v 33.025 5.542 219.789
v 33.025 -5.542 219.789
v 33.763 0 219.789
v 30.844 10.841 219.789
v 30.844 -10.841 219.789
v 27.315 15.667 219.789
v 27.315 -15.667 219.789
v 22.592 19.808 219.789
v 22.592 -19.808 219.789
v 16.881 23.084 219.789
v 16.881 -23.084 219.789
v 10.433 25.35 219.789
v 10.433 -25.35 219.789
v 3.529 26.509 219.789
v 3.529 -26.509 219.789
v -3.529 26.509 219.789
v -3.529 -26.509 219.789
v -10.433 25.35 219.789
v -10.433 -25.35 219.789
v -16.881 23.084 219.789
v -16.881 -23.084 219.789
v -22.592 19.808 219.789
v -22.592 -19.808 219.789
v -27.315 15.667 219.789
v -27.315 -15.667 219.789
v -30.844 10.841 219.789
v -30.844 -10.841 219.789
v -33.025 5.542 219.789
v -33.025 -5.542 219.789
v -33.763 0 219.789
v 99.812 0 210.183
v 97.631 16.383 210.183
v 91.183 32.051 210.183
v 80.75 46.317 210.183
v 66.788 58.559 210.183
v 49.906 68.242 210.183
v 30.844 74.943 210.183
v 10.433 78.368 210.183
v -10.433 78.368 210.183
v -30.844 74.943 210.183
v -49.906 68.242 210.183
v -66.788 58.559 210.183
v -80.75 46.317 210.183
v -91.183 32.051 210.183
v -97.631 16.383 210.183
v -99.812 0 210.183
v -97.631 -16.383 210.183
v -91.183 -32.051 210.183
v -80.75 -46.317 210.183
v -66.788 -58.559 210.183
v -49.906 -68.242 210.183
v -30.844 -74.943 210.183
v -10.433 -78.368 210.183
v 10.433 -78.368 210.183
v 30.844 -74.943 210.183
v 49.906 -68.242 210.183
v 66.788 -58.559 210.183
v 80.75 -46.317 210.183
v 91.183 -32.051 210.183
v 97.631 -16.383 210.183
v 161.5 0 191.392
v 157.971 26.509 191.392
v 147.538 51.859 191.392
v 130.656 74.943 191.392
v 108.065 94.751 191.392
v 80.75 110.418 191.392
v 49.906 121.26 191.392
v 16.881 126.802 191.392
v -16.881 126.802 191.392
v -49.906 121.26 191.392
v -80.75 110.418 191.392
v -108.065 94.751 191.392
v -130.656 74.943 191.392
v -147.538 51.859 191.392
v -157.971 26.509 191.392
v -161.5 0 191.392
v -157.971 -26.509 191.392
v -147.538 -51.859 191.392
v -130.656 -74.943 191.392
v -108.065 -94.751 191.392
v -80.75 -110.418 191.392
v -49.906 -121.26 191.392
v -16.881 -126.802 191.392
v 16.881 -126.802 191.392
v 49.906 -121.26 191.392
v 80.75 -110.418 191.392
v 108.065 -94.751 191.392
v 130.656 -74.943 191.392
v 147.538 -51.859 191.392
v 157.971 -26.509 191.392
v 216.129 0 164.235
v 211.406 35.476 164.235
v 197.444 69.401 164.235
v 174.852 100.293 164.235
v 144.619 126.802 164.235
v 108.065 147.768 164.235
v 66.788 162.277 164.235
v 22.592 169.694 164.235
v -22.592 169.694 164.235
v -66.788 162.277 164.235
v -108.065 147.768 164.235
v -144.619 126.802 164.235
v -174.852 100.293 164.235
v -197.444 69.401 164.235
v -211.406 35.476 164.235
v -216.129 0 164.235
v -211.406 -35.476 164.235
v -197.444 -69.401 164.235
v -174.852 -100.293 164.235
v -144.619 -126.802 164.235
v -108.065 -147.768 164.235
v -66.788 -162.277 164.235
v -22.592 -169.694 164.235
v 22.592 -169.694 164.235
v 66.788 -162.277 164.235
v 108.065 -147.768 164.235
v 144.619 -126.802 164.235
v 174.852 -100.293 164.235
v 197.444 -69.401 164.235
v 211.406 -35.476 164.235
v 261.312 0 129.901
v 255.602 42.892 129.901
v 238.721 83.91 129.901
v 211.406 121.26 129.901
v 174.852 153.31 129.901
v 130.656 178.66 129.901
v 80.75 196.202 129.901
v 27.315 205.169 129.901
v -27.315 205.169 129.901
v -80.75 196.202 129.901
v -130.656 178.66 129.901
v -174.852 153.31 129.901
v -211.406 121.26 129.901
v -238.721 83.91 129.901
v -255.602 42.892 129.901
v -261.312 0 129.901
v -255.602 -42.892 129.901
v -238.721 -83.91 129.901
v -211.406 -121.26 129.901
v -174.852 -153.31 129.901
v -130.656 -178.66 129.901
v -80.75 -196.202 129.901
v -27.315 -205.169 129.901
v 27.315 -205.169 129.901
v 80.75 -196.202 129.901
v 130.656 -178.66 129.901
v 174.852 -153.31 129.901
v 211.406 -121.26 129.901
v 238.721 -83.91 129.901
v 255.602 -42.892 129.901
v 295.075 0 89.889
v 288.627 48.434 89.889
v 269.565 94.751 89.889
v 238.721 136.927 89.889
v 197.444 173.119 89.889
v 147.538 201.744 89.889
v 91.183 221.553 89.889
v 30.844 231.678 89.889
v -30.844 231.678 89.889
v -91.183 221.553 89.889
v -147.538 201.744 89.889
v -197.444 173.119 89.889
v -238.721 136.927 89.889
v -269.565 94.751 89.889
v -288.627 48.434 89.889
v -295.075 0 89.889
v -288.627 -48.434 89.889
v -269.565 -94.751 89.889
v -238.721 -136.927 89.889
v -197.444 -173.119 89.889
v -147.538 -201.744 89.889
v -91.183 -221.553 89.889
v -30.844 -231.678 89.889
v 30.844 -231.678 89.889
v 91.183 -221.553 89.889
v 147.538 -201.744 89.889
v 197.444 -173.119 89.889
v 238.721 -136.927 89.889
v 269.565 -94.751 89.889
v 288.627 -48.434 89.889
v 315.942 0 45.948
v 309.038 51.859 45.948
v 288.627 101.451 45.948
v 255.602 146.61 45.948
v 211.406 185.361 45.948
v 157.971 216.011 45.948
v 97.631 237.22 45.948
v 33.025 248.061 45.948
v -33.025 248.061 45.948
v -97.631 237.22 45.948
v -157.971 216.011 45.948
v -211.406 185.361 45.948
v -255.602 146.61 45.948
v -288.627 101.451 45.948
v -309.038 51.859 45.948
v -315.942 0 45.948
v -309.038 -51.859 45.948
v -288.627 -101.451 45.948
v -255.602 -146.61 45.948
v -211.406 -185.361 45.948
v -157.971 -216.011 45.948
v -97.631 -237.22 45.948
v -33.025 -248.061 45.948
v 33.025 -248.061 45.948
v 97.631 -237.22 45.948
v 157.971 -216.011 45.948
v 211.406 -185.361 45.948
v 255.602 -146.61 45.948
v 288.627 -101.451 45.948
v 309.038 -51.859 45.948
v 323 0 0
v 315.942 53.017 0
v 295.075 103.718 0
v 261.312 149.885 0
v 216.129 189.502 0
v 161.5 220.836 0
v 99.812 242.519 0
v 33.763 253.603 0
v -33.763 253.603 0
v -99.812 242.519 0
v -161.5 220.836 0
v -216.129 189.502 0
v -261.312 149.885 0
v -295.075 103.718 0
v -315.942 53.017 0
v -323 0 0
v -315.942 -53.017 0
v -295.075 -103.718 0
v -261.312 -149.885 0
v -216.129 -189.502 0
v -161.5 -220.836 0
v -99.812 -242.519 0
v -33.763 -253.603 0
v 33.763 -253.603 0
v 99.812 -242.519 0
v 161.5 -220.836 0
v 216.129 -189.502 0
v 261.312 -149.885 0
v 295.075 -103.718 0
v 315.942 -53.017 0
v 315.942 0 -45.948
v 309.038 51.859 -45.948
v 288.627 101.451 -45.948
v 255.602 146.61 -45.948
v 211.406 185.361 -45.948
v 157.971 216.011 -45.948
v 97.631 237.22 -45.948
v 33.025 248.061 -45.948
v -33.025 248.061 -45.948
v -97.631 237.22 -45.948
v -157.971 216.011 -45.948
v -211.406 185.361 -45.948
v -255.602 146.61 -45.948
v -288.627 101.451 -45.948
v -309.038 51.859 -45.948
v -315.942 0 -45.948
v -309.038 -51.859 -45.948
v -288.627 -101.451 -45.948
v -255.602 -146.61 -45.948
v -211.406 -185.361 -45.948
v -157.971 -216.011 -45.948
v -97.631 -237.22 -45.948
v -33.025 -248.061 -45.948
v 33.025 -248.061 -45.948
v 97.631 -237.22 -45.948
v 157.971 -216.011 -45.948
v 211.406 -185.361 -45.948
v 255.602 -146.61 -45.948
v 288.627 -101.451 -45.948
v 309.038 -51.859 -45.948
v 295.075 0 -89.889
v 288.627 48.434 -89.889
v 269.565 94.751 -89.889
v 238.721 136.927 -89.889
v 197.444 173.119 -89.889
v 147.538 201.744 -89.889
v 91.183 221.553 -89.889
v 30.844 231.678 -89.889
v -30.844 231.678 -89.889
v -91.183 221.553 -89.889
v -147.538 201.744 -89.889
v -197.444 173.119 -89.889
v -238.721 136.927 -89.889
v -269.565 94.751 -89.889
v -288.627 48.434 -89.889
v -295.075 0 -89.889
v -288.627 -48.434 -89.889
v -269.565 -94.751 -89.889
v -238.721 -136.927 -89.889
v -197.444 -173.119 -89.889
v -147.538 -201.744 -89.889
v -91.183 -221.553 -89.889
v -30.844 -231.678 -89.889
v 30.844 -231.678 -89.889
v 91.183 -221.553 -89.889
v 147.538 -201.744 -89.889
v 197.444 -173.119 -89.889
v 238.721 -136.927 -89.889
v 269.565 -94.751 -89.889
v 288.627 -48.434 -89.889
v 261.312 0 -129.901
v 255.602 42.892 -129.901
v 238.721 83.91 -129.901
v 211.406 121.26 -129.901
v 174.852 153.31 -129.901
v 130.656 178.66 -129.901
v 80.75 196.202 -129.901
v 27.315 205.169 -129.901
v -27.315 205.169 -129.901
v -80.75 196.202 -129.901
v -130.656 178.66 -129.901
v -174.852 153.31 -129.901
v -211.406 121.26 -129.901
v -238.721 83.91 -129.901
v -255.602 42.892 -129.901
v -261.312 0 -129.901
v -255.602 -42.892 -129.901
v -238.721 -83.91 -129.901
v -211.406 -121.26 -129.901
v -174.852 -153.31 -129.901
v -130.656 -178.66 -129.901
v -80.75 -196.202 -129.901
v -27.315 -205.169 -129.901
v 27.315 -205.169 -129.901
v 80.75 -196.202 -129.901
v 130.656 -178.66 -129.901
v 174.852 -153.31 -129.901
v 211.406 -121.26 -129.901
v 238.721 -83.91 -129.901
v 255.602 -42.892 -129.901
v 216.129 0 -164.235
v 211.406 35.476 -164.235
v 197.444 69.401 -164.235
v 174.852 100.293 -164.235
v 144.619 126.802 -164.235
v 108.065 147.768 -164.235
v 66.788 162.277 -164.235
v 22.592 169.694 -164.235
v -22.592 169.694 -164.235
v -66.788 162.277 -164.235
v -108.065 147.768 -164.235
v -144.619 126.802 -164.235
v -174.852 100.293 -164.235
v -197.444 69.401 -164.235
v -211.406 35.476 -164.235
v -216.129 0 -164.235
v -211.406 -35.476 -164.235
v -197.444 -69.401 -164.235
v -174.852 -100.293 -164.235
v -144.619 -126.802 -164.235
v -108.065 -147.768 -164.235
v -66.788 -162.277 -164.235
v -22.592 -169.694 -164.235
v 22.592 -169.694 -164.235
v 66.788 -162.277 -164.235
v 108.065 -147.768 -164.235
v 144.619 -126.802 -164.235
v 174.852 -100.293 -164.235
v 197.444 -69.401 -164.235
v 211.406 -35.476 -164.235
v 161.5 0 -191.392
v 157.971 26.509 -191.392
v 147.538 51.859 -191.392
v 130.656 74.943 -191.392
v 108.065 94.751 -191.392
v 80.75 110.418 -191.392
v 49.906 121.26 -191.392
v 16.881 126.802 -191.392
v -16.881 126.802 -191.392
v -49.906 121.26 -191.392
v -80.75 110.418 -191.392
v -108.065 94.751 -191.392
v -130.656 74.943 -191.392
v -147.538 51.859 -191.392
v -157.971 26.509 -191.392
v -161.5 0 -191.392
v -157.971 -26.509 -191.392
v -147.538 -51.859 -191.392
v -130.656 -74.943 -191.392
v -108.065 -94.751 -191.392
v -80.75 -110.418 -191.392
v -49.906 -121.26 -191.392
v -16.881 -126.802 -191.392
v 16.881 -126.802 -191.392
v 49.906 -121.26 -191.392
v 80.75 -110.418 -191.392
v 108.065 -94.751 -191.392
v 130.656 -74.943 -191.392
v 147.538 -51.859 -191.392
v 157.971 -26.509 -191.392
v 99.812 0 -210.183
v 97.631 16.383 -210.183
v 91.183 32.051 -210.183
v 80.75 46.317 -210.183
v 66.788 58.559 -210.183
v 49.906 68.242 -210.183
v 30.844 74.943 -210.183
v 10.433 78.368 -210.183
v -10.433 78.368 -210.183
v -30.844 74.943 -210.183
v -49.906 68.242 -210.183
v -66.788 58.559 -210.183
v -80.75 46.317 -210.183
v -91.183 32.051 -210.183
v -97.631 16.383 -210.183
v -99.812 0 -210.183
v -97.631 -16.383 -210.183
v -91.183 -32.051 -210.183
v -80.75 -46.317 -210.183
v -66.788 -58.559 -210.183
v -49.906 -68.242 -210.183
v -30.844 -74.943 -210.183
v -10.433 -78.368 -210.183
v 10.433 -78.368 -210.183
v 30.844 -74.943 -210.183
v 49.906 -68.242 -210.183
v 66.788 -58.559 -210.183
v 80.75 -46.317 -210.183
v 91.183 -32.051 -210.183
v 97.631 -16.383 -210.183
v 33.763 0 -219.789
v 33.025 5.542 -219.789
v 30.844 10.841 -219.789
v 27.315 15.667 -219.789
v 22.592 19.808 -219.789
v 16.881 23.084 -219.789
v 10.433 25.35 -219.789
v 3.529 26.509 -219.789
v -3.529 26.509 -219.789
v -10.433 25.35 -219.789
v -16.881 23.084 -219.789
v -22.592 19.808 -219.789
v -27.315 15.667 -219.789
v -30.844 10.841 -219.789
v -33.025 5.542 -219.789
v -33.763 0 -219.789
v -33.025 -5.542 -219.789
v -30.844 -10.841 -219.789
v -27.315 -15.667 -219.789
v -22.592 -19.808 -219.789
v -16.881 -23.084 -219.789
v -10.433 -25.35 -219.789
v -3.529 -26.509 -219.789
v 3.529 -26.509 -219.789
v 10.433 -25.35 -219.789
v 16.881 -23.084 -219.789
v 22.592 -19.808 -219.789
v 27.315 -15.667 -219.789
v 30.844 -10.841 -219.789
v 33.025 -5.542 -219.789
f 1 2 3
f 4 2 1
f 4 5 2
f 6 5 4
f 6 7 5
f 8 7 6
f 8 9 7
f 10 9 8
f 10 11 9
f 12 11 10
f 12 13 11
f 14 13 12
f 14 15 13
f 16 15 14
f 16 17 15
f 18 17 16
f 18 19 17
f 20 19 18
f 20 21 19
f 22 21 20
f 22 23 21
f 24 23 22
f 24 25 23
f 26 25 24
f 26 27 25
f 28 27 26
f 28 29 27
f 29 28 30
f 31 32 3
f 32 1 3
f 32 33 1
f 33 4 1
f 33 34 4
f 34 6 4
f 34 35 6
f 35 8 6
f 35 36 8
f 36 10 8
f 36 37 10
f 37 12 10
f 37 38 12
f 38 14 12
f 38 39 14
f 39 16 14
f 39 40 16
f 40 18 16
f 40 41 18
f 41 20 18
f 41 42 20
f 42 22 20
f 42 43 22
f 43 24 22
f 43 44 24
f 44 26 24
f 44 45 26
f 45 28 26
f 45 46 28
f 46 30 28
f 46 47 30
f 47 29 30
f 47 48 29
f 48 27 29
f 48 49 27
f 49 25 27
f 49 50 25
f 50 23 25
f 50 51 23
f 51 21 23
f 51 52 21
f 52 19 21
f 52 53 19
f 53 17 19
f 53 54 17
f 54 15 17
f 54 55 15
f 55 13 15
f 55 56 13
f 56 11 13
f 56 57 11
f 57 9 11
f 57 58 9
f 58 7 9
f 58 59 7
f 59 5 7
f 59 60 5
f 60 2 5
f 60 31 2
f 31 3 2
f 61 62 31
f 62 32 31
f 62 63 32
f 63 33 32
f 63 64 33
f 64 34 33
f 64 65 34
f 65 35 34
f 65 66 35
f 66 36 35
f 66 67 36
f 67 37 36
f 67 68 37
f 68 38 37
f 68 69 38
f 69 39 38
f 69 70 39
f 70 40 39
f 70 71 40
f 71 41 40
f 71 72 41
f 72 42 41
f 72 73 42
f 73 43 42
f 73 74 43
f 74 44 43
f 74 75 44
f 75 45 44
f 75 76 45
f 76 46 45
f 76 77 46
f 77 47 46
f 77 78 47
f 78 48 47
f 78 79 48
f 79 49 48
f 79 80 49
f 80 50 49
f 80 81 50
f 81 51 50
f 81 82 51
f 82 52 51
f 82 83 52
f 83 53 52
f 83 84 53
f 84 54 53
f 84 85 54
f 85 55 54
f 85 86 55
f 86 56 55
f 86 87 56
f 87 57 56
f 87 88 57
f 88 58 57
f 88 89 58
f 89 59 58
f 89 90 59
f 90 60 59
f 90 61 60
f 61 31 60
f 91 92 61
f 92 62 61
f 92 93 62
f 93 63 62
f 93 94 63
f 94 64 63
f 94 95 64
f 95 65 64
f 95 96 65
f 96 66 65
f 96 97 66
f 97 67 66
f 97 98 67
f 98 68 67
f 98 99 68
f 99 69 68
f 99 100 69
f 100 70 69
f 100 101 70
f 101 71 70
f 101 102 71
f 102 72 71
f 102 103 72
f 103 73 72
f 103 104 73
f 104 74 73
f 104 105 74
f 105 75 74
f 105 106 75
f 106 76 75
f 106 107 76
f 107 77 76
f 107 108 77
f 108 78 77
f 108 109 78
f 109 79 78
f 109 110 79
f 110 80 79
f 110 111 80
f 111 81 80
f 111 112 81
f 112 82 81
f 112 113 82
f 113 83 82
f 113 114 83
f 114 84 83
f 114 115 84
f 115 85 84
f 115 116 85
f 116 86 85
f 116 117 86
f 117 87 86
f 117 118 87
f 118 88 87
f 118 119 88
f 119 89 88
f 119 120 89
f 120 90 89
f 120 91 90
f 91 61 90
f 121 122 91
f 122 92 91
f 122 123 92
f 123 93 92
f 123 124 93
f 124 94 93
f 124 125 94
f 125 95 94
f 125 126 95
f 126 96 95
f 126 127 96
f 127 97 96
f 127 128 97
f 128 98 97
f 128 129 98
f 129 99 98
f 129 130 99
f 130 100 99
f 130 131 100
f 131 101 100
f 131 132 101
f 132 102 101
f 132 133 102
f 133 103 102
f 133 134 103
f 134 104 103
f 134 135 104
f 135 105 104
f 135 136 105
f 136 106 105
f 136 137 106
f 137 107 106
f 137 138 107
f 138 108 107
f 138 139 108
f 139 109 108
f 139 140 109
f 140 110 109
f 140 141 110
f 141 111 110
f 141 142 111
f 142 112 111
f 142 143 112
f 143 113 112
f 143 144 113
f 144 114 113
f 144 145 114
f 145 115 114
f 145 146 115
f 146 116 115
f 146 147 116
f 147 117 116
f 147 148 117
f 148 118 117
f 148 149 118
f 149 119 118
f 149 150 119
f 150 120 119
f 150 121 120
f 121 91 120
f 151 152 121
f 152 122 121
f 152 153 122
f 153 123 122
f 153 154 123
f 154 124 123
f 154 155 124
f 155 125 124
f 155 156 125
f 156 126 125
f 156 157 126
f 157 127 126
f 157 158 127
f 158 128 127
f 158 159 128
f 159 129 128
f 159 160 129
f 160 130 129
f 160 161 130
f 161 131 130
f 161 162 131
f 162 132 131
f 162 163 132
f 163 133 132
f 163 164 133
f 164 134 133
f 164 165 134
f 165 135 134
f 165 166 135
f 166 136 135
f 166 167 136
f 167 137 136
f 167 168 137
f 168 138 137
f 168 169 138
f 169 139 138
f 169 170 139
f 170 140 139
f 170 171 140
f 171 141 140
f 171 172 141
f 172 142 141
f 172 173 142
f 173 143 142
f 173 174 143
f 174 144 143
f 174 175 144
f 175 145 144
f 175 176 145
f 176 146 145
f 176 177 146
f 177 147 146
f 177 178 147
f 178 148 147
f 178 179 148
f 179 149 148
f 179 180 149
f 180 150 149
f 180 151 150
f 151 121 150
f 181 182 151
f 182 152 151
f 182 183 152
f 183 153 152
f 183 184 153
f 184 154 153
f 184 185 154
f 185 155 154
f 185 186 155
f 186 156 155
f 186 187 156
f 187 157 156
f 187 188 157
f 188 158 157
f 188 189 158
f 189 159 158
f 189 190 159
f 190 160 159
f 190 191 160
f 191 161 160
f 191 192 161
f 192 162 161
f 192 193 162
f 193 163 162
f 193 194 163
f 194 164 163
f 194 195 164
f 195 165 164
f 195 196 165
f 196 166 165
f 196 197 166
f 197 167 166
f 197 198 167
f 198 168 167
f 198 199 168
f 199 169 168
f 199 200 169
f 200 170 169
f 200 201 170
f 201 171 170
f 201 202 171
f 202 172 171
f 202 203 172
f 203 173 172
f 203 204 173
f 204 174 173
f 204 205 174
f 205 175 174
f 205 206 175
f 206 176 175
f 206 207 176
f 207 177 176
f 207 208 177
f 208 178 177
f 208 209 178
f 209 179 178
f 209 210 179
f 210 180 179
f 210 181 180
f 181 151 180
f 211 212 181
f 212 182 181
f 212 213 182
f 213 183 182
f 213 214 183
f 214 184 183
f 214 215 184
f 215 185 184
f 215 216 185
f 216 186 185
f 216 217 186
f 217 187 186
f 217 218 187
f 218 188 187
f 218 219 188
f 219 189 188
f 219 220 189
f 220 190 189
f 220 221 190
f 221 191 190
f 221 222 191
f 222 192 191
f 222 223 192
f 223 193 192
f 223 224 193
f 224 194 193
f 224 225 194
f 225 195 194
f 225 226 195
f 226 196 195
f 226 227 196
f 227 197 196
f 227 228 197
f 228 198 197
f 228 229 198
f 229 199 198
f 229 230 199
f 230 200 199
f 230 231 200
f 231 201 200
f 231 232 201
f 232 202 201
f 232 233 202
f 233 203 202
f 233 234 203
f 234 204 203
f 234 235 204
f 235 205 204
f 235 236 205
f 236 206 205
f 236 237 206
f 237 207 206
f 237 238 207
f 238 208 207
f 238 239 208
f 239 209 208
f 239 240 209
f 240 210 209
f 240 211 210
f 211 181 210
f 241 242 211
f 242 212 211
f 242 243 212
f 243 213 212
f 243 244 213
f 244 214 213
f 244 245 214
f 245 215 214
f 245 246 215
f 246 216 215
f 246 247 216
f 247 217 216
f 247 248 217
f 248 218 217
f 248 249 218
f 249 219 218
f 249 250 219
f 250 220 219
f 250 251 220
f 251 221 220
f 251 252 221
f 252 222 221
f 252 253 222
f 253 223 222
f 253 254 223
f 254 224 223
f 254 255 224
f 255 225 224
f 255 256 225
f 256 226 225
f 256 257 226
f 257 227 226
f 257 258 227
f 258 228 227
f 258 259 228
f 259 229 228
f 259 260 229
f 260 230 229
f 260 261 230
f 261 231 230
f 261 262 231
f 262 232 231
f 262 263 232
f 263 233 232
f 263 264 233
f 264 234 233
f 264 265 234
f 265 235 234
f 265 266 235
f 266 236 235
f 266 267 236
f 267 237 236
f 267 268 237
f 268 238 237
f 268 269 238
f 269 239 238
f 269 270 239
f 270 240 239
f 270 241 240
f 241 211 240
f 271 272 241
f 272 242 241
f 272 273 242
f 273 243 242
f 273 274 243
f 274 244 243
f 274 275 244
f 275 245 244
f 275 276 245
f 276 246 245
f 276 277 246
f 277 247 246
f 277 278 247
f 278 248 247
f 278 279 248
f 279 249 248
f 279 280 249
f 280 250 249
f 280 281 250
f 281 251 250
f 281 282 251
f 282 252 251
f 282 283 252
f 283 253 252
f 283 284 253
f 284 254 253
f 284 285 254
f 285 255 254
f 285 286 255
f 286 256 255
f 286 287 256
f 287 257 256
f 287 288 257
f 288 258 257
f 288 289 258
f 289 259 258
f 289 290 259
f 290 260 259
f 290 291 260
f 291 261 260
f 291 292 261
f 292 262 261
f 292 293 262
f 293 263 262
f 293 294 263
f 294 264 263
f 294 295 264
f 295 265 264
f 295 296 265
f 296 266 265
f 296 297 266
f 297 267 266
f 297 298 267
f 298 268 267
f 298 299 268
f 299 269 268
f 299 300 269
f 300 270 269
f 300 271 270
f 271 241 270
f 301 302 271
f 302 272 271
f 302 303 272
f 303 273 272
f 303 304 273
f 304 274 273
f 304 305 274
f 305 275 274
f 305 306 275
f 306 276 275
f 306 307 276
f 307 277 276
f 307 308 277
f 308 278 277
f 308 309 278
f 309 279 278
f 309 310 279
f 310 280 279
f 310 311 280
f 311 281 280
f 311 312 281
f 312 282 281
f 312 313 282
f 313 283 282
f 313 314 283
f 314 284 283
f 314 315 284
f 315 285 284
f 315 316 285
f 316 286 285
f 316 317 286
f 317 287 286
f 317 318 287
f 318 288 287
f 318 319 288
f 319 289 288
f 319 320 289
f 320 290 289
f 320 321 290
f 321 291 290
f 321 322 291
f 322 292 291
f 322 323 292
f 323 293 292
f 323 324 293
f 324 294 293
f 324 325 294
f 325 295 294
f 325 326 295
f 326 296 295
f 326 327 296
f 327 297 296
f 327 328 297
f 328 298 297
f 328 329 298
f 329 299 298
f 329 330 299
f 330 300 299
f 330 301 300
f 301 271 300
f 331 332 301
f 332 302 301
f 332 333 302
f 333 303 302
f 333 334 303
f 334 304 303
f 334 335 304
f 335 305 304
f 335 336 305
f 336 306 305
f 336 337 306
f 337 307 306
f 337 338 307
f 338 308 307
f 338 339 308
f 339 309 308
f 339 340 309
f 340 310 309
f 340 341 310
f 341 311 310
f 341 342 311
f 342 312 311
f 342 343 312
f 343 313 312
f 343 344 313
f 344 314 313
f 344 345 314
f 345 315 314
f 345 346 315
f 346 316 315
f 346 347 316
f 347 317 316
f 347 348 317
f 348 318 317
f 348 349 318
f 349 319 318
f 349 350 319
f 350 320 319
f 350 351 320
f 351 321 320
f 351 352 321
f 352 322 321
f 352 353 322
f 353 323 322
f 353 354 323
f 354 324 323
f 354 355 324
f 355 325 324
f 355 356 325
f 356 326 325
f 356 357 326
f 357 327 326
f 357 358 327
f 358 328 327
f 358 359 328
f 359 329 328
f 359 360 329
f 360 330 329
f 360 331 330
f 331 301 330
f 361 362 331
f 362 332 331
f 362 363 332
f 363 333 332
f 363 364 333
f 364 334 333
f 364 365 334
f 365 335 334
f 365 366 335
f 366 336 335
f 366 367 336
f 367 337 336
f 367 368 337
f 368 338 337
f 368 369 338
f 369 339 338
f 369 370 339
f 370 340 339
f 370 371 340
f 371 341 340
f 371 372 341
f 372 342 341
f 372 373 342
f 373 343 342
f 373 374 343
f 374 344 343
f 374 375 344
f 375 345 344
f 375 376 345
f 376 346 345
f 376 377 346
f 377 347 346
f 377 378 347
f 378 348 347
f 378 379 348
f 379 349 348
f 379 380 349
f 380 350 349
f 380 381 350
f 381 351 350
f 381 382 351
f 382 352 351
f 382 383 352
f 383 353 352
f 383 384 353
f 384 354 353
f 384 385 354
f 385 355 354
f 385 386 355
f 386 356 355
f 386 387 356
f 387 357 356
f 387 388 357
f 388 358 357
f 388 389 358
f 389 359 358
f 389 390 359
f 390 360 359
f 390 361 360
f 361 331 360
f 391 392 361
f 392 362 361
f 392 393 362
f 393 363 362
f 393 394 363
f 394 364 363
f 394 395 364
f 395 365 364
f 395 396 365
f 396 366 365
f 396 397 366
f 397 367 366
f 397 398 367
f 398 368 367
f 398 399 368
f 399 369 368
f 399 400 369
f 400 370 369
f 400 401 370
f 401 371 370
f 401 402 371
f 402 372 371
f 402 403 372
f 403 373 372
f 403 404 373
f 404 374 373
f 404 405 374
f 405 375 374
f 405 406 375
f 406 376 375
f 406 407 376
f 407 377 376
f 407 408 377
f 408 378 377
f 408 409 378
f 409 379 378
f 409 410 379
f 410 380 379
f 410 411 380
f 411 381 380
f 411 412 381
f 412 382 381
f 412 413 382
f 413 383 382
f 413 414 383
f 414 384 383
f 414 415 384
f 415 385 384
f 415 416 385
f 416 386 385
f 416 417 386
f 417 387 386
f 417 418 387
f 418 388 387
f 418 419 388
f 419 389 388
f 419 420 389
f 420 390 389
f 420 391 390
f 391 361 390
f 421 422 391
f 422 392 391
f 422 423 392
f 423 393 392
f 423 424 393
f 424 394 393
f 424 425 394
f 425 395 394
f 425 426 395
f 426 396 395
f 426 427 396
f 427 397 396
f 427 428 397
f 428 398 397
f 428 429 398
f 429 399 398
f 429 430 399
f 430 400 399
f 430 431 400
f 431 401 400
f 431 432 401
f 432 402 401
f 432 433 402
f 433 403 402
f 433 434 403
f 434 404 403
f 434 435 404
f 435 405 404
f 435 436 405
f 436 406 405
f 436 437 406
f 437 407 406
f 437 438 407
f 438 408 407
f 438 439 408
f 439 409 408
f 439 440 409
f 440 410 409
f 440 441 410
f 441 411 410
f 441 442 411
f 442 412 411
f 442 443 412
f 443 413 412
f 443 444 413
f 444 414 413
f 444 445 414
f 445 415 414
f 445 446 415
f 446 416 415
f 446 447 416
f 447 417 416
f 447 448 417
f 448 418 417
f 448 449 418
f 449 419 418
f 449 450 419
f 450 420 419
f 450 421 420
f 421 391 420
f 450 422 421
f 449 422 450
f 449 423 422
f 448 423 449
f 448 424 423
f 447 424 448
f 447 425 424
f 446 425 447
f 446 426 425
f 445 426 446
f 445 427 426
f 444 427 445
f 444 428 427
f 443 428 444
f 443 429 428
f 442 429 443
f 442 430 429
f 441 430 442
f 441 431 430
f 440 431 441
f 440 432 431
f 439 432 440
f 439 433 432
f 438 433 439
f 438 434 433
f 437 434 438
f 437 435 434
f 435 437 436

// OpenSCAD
// Generated by SolidPython 1.0.1 on 2020-07-29 00:46:54


scale(v = [19, 15, 13]) {
	sphere(r = 17);
}
/***********************************************
*********      SolidPython code:      **********
************************************************
 
# import packages: SolidPython
from solid import *
from solid.utils import *
from itertools import chain, combinations, permutations


class Resize:

    def __init__(self, scad_file):
        self.scad_file = scad_file
        #self.scad_file = import_scad(scad_file)
        # cone/cylinder param:
        self.r1 = 0
        self.r2 = 0
        self.h = 0
        # rectangular prism param:
        self.w = 0
        self.l = 0
        # ellipse param:
        self.r = 0

    # import OpenScad code (file name corresponds to shape)


    # classify shape + parameters
    def assign(self, param1, param2, param3):
        if self.scad_file == 'cone.scad':
            self.r1 = param1
            self.r2 = param2
            self.h = param3
        elif self.scad_file == 'cylinder.scad':
            self.r1 = param1
            self.r2 = param2
            self.h = param3
        elif self.scad_file == 'rectangularPrism.scad':
            self.h = param1
            self.l = param2
            self.w = param3
        else:
            self.r = param1
            self.h = param2

    # resize parameters
    def iterate(self):
        x = range(3, 20, 2)
        i = 1
        if self.scad_file == 'cone.scad':
            tempList = list(permutations(x, 2))
            for temp in tempList:
                param1 = temp[0]
                param2 = temp[1]
                filepath = 'produced_scad_files/' + 'cone' + str(param1) + '_' + str(param2) + '_' + '.scad'
                scad_render_to_file(cylinder(h=param1, r1=param2, r2=0), filepath)

        elif self.scad_file == 'cylinder.scad':
            tempList = list(permutations(x, 3))
            for temp in tempList:
                param1 = temp[0]
                param2 = temp[1]
                filepath = 'produced_scad_files/' + 'cylinder' + str(param1) + '_' + str(param2) + '_' + '.scad'
                scad_render_to_file(cylinder(h=param1, r1=param2, r2=param2), filepath)

        elif self.scad_file == 'rectangularPrism.scad':
            tempList = list(permutations(x, 3))
            for temp in tempList:
                param1 = temp[0]
                param2 = temp[1]
                param3 = temp[2]
                filepath = 'produced_scad_files/' + 'rectangularPrism' + str(param1) + '_' + str(param2) + '_' + str(
                    param3) + '.scad'
                scad_render_to_file(cube(size=(param1, param2, param3)), filepath)

        elif self.scad_file == 'ellipse.scad':
            tempList = list(permutations(x, 4))
            for temp in tempList:
                param1 = temp[0]
                param2 = temp[1]
                param3 = temp[2]
                param4 = temp[3]
                filepath = 'produced_scad_files/' + 'ellipse' + str(param1) + '_' + str(param2) + '_' + str(param3) + '_' + str(param4) + '.scad'
                scad_render_to_file(scale([param1, param2, param3])(sphere(r=param4)), filepath)

    def render_to_scadfile(self):
        scad_render_to_file(scad, 'example.scad') 
 
************************************************/
